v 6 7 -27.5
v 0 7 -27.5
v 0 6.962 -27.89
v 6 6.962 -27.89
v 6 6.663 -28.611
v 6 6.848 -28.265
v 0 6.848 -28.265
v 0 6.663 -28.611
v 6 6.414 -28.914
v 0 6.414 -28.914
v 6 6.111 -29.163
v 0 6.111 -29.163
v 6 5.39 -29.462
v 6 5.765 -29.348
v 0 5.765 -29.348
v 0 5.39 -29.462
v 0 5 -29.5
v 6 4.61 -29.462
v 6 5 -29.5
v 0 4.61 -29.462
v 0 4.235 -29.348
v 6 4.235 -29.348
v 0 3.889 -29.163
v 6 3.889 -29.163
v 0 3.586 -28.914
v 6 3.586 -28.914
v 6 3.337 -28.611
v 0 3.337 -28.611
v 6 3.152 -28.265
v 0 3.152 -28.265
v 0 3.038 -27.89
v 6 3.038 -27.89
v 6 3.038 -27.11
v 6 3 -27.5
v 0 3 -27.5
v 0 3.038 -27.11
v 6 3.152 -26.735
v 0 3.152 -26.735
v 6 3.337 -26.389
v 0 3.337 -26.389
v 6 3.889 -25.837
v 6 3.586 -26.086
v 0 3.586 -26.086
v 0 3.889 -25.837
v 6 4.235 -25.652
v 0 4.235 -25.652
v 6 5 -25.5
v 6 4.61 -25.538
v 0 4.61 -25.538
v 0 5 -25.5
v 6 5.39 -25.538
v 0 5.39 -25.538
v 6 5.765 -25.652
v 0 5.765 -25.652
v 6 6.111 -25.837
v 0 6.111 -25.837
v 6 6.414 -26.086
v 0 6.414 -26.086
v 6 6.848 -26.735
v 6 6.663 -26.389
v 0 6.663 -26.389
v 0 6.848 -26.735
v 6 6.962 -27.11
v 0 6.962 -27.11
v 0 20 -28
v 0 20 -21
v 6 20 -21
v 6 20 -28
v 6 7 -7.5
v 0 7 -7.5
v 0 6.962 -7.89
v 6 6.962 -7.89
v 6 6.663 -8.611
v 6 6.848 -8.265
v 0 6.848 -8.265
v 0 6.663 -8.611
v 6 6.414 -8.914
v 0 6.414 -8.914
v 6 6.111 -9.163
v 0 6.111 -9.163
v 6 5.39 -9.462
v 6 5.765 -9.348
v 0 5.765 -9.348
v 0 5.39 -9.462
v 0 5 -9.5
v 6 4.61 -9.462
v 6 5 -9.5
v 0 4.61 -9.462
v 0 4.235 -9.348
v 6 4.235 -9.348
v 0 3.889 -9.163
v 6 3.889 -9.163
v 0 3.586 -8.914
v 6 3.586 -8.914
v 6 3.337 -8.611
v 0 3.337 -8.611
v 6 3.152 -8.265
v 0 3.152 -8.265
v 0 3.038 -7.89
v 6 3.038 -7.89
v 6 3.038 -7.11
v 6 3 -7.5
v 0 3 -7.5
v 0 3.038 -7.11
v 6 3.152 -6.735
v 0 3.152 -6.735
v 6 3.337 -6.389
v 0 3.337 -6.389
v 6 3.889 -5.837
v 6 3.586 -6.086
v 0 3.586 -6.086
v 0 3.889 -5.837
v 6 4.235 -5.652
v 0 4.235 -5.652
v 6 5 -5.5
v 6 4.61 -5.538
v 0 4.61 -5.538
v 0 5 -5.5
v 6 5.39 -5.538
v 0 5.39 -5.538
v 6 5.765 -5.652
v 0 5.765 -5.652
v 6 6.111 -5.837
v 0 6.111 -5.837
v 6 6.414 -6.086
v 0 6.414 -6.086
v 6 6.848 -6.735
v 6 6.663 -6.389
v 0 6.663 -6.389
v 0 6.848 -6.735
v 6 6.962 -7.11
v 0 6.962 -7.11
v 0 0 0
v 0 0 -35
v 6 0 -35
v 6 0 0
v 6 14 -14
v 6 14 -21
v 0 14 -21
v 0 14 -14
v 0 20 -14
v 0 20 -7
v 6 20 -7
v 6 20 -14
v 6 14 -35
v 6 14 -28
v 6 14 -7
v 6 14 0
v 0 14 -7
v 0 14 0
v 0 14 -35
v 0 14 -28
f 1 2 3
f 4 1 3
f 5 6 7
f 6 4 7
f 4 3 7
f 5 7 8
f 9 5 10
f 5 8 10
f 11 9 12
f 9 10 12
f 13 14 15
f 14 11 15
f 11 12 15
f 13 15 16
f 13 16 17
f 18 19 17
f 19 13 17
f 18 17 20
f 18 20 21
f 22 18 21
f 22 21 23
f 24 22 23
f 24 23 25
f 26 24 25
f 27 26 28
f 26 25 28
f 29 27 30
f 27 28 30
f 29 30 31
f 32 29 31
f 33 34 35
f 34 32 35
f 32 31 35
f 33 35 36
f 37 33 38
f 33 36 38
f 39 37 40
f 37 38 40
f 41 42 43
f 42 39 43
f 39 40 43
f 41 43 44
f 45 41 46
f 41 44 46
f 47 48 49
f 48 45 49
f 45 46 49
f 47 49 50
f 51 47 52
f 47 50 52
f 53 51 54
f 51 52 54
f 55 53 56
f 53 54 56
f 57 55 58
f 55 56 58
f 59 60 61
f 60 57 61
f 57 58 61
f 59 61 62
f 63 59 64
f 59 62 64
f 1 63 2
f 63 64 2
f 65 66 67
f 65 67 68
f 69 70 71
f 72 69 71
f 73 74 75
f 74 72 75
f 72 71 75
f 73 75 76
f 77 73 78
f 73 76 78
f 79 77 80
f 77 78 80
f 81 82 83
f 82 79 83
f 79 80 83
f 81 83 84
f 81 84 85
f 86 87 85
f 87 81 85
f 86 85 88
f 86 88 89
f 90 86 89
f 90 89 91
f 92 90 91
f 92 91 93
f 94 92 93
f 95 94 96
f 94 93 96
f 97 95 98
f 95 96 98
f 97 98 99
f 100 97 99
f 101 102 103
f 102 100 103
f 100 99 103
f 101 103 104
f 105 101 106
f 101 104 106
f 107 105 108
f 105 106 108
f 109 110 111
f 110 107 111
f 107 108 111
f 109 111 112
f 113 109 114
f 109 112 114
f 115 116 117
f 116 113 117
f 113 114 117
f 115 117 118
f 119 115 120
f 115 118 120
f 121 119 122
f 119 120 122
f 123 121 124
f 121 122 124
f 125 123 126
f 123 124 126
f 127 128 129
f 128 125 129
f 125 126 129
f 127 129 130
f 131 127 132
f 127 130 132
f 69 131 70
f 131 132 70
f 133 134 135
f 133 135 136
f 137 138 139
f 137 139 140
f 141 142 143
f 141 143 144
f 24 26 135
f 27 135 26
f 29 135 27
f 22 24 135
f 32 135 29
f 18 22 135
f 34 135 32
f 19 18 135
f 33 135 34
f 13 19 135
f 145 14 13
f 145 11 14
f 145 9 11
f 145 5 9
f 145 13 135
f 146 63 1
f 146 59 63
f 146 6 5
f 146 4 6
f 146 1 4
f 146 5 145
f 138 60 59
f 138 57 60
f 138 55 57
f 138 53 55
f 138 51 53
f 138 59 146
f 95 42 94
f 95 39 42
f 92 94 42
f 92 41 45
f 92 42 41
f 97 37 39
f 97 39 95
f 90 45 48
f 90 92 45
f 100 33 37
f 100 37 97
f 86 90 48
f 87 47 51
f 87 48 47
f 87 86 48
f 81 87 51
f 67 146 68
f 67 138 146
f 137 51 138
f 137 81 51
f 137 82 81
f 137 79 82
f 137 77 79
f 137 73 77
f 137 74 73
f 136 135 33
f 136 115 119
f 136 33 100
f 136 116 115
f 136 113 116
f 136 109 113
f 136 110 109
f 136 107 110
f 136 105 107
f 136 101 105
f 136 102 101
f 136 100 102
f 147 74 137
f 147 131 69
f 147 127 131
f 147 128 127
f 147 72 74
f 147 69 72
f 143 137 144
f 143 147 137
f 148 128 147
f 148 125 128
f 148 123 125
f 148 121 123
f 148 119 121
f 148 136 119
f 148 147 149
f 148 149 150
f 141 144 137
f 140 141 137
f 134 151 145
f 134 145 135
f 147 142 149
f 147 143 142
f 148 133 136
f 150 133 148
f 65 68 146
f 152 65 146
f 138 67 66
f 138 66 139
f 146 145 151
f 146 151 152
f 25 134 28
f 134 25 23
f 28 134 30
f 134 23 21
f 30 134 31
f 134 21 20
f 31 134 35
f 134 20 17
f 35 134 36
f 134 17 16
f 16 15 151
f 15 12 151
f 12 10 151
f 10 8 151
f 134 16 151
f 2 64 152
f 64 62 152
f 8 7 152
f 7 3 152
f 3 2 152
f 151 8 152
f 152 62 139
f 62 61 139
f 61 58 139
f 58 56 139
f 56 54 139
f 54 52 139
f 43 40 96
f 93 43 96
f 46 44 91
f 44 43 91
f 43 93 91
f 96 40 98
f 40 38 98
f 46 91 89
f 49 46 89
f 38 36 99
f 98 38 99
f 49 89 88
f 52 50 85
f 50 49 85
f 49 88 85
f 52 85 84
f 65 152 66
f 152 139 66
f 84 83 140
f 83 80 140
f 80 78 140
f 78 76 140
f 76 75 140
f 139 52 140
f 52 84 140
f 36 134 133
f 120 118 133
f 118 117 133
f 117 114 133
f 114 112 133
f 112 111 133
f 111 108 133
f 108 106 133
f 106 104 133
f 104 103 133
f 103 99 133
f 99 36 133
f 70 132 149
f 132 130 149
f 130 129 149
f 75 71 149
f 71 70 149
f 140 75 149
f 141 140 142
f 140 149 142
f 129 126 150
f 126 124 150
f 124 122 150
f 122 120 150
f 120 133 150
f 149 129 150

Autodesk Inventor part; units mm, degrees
ref_plane "YZ Plane" through (0, 0, 0) normal (1, 0, 0) x (0, 1, 0)
ref_plane "XZ Plane" through (0, 0, 0) normal (0, 1, 0) x (-1, 0, 0)
ref_plane "XY Plane" through (0, 0, 0) normal (0, 0, 1) x (1, 0, 0)
sketch "Sketch1" plane through (0, 0, 0) normal (1, 0, 0) x (0, 1, 0)
  line L0 (0, 0) -> (20, 0)
  line L1 (20, 0) -> (20, -35)
  line L2 (20, -35) -> (0, -35)
  line L3 (0, -35) -> (0, 0)
  circle A0 centre (5, -7.5) radius 2
  circle A1 centre (5, -27.5) radius 2
  dimension "d0" = 20
  dimension "d1" = 35
  dimension "d5" = 4
  dimension "d6" = 4
extrude "Extrusion1" add sketch "Sketch1" along normal blind 6
sketch "Sketch2" plane through (6, 0, 0) normal (1, 0, 0) x (0, 0, -1)
  line L0 (0, 20) -> (0, 0) projected
  line L1 (0, 20) -> (7, 20)
  line L2 (7, 20) -> (7, 14)
  line L3 (7, 14) -> (0, 14)
  line L4 (0, 14) -> (0, 20)
  dimension "d9" = 7
  dimension "d10" = 6
extrude "Extrusion2" cut sketch "Sketch2" against normal blind 6
pattern_linear "Rectangular Pattern1" count 3 spacing 14 along (0, 0, -1) of "Extrusion2"
properties part number "g_mount 2"
